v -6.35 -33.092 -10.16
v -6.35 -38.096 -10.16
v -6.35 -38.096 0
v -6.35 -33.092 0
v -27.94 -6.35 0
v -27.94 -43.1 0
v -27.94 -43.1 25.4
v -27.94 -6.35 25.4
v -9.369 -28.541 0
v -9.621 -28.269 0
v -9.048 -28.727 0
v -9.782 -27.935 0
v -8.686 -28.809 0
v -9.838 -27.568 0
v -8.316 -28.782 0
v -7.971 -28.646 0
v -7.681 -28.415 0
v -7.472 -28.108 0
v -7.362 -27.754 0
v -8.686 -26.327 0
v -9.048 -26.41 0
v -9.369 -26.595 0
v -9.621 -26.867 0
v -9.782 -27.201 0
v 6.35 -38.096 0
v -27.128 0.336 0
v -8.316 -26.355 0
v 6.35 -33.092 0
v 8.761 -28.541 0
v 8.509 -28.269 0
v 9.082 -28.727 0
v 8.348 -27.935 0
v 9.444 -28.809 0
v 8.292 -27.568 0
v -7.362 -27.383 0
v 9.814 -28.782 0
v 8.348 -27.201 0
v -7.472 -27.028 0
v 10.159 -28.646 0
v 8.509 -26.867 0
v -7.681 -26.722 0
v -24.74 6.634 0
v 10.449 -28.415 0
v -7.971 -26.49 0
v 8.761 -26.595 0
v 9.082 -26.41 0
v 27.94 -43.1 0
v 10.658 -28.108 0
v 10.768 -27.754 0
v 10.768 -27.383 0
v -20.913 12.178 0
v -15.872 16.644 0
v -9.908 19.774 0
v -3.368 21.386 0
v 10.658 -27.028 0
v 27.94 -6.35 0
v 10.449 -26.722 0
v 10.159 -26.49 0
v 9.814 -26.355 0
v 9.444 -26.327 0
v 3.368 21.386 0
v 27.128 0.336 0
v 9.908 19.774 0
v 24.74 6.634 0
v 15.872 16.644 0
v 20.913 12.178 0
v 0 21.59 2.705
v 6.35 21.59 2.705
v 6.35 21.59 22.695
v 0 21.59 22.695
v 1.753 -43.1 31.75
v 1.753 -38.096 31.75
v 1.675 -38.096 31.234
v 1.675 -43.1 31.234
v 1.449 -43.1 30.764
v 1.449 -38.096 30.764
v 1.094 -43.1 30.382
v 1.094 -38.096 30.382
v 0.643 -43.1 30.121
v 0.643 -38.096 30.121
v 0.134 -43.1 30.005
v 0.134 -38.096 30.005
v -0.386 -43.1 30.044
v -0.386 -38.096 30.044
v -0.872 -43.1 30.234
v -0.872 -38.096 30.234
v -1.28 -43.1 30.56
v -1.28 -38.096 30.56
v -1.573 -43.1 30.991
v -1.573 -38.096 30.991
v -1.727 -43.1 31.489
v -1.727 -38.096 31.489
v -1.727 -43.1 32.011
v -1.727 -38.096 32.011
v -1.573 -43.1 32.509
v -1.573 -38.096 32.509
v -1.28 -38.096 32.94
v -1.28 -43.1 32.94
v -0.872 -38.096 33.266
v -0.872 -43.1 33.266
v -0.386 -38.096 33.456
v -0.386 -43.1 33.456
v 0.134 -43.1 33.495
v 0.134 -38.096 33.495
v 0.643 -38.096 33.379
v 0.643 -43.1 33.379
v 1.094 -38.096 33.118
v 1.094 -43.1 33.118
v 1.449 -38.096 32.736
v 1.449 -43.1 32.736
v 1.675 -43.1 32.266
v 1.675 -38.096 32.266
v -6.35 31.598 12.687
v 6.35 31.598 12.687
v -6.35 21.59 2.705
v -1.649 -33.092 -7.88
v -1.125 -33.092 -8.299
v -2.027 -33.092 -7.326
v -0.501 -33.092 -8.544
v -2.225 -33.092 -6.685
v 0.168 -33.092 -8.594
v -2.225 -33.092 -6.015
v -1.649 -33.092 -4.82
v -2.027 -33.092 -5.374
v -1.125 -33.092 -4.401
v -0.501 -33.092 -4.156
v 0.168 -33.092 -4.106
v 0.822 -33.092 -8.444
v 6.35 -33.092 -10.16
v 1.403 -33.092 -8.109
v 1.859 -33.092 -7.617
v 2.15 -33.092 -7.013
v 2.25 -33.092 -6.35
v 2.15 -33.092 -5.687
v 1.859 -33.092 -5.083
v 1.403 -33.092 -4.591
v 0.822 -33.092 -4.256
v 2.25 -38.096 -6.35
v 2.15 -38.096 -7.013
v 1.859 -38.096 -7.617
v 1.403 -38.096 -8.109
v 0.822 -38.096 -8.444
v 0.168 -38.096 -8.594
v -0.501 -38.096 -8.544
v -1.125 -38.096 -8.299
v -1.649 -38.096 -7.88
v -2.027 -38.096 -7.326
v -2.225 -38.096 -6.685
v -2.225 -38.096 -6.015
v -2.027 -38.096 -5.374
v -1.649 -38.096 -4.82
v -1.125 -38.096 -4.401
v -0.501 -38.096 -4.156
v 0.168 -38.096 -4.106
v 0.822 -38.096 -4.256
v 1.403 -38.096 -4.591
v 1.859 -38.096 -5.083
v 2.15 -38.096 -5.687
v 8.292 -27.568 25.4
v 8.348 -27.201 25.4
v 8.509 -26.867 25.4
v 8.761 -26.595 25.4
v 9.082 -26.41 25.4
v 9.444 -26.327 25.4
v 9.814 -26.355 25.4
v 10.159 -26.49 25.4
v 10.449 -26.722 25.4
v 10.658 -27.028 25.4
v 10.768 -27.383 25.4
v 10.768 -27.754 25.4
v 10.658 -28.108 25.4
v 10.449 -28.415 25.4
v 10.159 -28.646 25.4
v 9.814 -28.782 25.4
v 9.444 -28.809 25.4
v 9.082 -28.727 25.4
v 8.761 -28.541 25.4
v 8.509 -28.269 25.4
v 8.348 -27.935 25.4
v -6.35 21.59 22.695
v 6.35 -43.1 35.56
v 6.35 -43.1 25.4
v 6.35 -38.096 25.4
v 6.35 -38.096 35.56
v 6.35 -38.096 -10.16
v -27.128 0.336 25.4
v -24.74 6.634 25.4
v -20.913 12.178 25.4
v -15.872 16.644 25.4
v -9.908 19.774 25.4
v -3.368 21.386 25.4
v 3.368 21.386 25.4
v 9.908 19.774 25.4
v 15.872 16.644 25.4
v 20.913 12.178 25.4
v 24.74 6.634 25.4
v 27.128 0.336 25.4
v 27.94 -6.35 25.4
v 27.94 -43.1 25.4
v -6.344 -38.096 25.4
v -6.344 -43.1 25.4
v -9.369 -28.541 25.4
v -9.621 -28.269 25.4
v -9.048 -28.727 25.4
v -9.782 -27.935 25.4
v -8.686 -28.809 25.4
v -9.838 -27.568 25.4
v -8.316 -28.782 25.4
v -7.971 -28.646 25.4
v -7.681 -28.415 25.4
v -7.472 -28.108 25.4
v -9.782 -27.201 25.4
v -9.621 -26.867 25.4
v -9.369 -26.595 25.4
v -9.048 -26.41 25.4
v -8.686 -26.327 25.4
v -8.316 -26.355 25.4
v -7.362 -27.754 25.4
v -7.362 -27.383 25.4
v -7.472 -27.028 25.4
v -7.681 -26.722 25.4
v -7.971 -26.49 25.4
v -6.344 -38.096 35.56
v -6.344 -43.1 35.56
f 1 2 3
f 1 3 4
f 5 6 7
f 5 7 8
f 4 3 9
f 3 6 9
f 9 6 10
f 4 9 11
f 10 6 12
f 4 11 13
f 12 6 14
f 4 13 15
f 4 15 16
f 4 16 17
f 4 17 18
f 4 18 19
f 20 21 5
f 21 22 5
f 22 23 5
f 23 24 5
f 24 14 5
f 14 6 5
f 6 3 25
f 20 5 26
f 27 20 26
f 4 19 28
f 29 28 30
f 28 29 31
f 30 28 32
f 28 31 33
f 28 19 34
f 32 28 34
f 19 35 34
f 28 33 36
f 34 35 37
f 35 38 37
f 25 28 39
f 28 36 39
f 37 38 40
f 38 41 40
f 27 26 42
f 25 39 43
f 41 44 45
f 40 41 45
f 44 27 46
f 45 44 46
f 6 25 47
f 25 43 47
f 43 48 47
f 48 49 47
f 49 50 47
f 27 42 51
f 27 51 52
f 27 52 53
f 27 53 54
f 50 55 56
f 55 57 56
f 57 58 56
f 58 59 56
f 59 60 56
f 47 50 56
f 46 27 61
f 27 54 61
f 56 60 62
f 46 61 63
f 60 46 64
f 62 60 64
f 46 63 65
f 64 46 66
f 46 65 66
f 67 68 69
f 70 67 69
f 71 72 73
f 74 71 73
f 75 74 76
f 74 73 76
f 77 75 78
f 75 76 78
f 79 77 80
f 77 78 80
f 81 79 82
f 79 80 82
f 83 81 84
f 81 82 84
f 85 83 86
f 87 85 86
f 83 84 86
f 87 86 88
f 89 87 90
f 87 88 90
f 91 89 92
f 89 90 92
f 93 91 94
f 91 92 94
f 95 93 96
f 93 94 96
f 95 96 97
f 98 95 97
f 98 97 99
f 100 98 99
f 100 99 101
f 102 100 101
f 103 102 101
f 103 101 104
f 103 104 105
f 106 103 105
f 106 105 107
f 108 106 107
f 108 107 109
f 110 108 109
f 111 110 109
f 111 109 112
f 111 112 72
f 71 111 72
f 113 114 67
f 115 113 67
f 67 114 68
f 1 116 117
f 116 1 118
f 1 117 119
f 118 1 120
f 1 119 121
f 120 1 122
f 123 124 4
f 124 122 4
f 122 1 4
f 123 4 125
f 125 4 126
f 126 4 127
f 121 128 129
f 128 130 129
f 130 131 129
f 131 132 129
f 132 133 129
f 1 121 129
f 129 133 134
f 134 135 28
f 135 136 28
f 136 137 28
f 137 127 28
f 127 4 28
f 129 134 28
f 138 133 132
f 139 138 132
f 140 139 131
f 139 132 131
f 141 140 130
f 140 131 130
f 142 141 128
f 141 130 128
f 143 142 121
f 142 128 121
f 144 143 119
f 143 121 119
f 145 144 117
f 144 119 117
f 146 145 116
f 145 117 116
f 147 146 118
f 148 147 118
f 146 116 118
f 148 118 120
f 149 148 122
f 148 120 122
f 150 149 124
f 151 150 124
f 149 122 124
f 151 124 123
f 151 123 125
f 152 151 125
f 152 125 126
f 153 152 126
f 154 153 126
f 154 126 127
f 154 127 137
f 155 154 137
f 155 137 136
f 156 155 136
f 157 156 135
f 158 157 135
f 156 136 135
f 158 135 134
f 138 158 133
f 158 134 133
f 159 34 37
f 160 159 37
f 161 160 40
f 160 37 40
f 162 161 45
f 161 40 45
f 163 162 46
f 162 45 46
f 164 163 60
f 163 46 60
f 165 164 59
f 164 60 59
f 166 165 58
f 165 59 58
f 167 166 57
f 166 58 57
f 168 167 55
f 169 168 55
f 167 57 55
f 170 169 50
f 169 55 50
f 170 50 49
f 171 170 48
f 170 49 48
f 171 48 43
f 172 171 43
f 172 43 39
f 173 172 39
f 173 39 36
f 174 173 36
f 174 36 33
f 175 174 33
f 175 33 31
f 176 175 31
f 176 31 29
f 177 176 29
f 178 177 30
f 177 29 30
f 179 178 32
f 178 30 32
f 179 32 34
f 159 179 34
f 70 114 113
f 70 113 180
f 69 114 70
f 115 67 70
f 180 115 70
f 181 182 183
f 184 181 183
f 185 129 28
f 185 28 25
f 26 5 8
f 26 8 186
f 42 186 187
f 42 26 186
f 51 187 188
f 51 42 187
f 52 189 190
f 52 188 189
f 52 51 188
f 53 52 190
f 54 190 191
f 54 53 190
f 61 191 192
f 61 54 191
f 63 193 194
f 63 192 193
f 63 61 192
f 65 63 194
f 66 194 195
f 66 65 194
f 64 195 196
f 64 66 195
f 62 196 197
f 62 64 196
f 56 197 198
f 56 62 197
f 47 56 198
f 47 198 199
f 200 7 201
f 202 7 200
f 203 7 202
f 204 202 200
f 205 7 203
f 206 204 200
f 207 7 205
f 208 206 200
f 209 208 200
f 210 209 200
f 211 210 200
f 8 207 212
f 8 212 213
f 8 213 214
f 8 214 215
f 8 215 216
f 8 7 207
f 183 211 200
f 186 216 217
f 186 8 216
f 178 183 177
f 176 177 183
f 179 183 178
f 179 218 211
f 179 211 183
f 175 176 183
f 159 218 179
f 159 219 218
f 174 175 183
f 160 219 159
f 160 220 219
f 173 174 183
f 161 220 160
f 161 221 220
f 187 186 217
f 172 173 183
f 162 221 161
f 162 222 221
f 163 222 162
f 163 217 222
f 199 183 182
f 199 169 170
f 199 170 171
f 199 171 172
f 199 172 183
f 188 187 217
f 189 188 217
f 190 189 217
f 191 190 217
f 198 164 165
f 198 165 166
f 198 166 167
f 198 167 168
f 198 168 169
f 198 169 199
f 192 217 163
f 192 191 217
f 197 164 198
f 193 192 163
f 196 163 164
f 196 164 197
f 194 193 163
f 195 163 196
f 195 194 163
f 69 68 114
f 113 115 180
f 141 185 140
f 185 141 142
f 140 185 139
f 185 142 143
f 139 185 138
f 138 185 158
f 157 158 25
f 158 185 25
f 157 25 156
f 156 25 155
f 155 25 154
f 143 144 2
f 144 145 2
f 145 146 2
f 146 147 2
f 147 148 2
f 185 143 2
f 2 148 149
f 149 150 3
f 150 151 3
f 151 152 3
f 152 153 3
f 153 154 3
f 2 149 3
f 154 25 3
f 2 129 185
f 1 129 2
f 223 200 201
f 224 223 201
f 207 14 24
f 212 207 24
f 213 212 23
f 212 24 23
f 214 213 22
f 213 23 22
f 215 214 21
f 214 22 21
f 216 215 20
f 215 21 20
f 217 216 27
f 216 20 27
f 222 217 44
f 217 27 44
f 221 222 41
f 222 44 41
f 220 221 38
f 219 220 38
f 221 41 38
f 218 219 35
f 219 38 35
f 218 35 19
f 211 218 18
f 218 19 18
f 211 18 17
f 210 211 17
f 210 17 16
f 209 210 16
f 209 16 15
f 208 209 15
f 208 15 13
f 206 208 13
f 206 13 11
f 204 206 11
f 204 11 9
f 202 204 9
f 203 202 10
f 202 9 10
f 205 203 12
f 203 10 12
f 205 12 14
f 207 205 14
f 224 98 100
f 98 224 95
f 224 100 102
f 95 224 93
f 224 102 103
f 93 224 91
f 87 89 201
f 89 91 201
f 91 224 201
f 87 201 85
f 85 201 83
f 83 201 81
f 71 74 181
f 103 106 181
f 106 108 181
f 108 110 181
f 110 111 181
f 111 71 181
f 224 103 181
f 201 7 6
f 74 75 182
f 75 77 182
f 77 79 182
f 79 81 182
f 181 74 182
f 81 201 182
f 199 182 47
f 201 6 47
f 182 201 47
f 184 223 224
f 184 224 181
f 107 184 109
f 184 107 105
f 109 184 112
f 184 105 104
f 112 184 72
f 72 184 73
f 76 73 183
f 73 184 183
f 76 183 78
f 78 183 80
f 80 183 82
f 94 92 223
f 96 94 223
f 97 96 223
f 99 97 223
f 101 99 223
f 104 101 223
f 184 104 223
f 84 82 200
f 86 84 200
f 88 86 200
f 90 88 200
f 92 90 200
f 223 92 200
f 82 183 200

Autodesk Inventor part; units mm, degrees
ref_plane "YZ Plane" through (0, 0, 0) normal (1, 0, 0) x (0, 1, 0)
ref_plane "XZ Plane" through (0, 0, 0) normal (0, 1, 0) x (-1, 0, 0)
sketch "Sketch1" plane through (0, 0, 0) normal (0, 0, 1) x (1, 0, 0)
  line L0 (6.3576, -38.0962) -> (6.3576, -43.1) projected
  line L1 (6.3576, -43.1) -> (22.8752, -43.1) projected
  line L2 (22.8752, -43.1) -> (22.8752, 0) projected
  line L3 (22.8752, 0) -> (22.86, 0) projected
  arc A0 (22.86, 0) -> (-22.86, 0) centre (0, 0) ccw projected
  line L4 (-22.86, 0) -> (-22.86, -43.1) projected
  line L5 (-22.86, -43.1) -> (-6.3424, -43.1) projected
  line L6 (-6.3424, -43.1) -> (-6.3424, -38.0962) projected
  line L7 (-6.3424, -38.0962) -> (6.3576, -38.0962) projected
  line L8 (14.6164, -43.1) -> (-27.9273, -43.1)
  line L9 (-27.9273, -43.1) -> (27.94, -43.1)
  line L10 (0, 0) -> (0, -6.35)
  circle A1 centre (0, -6.35) radius 27.94
  line L11 (-27.94, -6.35) -> (27.94, -6.35)
  line L12 (27.94, -6.35) -> (27.94, -43.1)
  line L13 (27.94, -43.1) -> (-27.94, -43.1)
  line L14 (-27.94, -43.1) -> (-27.94, -6.35)
  point P0 (0, 0)
  dimension "d27" = 55.88
  dimension "d26" = 6.35
extrude "Extrusion1" add sketch "Sketch1" along normal blind 25.4 contours L7 L6 L5 L4 A1 L2 L1 L0 | L0 L8 L6 L7 | L2 A1 L12 L9 | L8 L13 L14 A1 L4 | A1 L4 L11 L2 | L2 L11 A1 | A1 L11 L4 | L11 L4 A0 A1 L3 L2 | L2 L3 A0 A1 L11 | L11 A1 A0 L4
sketch "Sketch2" plane through (0, 0, 0) normal (0, 0, -1) x (-1, 0, 0)
  line L0 (7.62, -43.1) -> (-7.62, -43.1) projected
  line L1 (-7.62, -43.1) -> (-7.62, -38.0962) projected
  line L2 (-7.62, -38.0962) -> (7.62, -38.0962) projected
  line L3 (7.62, -38.0962) -> (7.62, -43.1) projected
  line L4 (-0.0064, -43.1) -> (6.3436, -43.1)
  line L5 (6.3436, -43.1) -> (-6.3564, -43.1)
  line L6 (6.3436, -43.1) -> (-6.35, -43.1)
  line L7 (-6.35, -38.0962) -> (6.35, -38.0962)
  line L8 (-6.35, -38.0962) -> (6.35, -38.0962)
  line L9 (6.35, -38.0962) -> (6.35, -33.0924)
  line L10 (6.35, -33.0924) -> (-6.35, -33.0924)
  line L11 (-6.35, -33.0924) -> (-6.35, -38.0962)
  point P0 (0, 0)
  dimension "d19" = 6.35
  dimension "d20" = 12.7
  dimension "d21" = 5.0038
extrude "Extrusion2" add sketch "Sketch2" along normal blind 10.16 contours L2 L11 L10 L9
sketch "Sketch4" plane through (0, 0, 25.4) normal (0, 0, 1) x (1, 0, 0)
  line L0 (0.0064, -43.1) -> (6.3564, -43.1)
  line L1 (6.3564, -43.1) -> (-6.3436, -43.1)
  line L2 (-6.3436, -43.1) -> (6.35, -43.1)
  line L3 (6.35, -43.1) -> (6.35, -38.0962)
  line L4 (6.35, -38.0962) -> (-6.3436, -38.0962)
  line L5 (-6.3436, -38.0962) -> (-6.3436, -43.1)
  point P0 (0, 0)
  dimension "d10" = 6.35
  dimension "d11" = 12.7
  dimension "d12" = 5.0038
extrude "Extrusion4" add sketch "Sketch4" along normal blind 10.16
sketch "Sketch5" plane through (-6.3436, -38.0962, 25.4) normal (0, 1, 0) x (1, 0, 0)
  line L0 (12.6936, -10.16) -> (0, -10.16) projected
  line L1 (6.3468, -10.16) -> (6.3468, -6.35)
  circle A0 centre (6.3468, -6.35) radius 1.75
  point P0 (6.3436, 25.4)
  dimension "d15" = 3.81
  dimension "d16" = 3.5
extrude "Extrusion5" cut sketch "Sketch5" against normal blind 10.16
sketch "Sketch6" plane through (-6.35, -33.0924, 0) normal (0, 1, 0) x (1, 0, 0)
  line L0 (12.7, 10.16) -> (0, 10.16) projected
  line L1 (6.35, 10.16) -> (6.35, 6.35)
  circle A0 centre (6.35, 6.35) radius 2.25
  point P0 (6.35, 0)
  dimension "d22" = 3.81
  dimension "d23" = 4.5
extrude "Extrusion6" cut sketch "Sketch6" against normal blind 10.16
ref_plane "Work Plane1" through (0, -43.1, 0) normal (-1, 0, 0) x (0, 0, 1)
sketch "Sketch7" plane through (0, -43.1, 0) normal (-1, 0, 0) x (0, 0, 1)
  line L0 (0, 64.69) -> (0, 36.75) projected
  line L1 (0, 64.69) -> (2.7051, 64.69)
  line L2 (0, 64.69) -> (25.4, 64.69) projected
  line L3 (2.7051, 64.69) -> (22.6949, 64.69)
  line L4 (22.6949, 64.69) -> (12.6873, 64.69)
  line L5 (12.6873, 64.69) -> (12.6873, 74.6976)
  line L6 (12.6873, 74.6976) -> (22.6949, 64.69)
  line L7 (12.6873, 74.6976) -> (2.7051, 64.69)
  point P0 (0, 43.1)
  dimension "d29" = 2.7051
  dimension "d30" = 19.9898
  dimension "d31" = 10.0076
  dimension "d32" = 10.0076
extrude "Extrusion7" add sketch "Sketch7" along normal mid plane 12.7
sketch "Sketch8" plane through (0, 0, 0) normal (0, 0, -1) x (-1, 0, 0)
  ellipse E0 centre (-10.537, -27.5683) end of major axis (-10.537, -26.3183) minor radius 1.25 projected
  ellipse E1 centre (9.593, -27.5683) end of major axis (9.593, -26.3237) minor radius 1.2446 projected
  line L0 (-10.537, -27.5683) -> (-9.537, -27.5683)
  line L1 (9.593, -27.5683) -> (8.593, -27.5683)
  circle A0 centre (-9.537, -27.5683) radius 1.2446
  circle A1 centre (8.593, -27.5683) radius 1.2446
  point P0 (0, 0)
  dimension "d35" = 1
  dimension "d36" = 1
  dimension "d37" = 2.4892
  dimension "d38" = 2.4892
extrude "Extrusion8" cut sketch "Sketch8" against normal blind 25.4 contours A0 E0 | E0 A0 | A1 E1 | E1 A1 picked at (-10.2799, -27.7436) picked at (-8.6366, -27.4668) picked at (9.3378, -27.743) picked at (7.6944, -27.4665)
properties part number "Tail4"
